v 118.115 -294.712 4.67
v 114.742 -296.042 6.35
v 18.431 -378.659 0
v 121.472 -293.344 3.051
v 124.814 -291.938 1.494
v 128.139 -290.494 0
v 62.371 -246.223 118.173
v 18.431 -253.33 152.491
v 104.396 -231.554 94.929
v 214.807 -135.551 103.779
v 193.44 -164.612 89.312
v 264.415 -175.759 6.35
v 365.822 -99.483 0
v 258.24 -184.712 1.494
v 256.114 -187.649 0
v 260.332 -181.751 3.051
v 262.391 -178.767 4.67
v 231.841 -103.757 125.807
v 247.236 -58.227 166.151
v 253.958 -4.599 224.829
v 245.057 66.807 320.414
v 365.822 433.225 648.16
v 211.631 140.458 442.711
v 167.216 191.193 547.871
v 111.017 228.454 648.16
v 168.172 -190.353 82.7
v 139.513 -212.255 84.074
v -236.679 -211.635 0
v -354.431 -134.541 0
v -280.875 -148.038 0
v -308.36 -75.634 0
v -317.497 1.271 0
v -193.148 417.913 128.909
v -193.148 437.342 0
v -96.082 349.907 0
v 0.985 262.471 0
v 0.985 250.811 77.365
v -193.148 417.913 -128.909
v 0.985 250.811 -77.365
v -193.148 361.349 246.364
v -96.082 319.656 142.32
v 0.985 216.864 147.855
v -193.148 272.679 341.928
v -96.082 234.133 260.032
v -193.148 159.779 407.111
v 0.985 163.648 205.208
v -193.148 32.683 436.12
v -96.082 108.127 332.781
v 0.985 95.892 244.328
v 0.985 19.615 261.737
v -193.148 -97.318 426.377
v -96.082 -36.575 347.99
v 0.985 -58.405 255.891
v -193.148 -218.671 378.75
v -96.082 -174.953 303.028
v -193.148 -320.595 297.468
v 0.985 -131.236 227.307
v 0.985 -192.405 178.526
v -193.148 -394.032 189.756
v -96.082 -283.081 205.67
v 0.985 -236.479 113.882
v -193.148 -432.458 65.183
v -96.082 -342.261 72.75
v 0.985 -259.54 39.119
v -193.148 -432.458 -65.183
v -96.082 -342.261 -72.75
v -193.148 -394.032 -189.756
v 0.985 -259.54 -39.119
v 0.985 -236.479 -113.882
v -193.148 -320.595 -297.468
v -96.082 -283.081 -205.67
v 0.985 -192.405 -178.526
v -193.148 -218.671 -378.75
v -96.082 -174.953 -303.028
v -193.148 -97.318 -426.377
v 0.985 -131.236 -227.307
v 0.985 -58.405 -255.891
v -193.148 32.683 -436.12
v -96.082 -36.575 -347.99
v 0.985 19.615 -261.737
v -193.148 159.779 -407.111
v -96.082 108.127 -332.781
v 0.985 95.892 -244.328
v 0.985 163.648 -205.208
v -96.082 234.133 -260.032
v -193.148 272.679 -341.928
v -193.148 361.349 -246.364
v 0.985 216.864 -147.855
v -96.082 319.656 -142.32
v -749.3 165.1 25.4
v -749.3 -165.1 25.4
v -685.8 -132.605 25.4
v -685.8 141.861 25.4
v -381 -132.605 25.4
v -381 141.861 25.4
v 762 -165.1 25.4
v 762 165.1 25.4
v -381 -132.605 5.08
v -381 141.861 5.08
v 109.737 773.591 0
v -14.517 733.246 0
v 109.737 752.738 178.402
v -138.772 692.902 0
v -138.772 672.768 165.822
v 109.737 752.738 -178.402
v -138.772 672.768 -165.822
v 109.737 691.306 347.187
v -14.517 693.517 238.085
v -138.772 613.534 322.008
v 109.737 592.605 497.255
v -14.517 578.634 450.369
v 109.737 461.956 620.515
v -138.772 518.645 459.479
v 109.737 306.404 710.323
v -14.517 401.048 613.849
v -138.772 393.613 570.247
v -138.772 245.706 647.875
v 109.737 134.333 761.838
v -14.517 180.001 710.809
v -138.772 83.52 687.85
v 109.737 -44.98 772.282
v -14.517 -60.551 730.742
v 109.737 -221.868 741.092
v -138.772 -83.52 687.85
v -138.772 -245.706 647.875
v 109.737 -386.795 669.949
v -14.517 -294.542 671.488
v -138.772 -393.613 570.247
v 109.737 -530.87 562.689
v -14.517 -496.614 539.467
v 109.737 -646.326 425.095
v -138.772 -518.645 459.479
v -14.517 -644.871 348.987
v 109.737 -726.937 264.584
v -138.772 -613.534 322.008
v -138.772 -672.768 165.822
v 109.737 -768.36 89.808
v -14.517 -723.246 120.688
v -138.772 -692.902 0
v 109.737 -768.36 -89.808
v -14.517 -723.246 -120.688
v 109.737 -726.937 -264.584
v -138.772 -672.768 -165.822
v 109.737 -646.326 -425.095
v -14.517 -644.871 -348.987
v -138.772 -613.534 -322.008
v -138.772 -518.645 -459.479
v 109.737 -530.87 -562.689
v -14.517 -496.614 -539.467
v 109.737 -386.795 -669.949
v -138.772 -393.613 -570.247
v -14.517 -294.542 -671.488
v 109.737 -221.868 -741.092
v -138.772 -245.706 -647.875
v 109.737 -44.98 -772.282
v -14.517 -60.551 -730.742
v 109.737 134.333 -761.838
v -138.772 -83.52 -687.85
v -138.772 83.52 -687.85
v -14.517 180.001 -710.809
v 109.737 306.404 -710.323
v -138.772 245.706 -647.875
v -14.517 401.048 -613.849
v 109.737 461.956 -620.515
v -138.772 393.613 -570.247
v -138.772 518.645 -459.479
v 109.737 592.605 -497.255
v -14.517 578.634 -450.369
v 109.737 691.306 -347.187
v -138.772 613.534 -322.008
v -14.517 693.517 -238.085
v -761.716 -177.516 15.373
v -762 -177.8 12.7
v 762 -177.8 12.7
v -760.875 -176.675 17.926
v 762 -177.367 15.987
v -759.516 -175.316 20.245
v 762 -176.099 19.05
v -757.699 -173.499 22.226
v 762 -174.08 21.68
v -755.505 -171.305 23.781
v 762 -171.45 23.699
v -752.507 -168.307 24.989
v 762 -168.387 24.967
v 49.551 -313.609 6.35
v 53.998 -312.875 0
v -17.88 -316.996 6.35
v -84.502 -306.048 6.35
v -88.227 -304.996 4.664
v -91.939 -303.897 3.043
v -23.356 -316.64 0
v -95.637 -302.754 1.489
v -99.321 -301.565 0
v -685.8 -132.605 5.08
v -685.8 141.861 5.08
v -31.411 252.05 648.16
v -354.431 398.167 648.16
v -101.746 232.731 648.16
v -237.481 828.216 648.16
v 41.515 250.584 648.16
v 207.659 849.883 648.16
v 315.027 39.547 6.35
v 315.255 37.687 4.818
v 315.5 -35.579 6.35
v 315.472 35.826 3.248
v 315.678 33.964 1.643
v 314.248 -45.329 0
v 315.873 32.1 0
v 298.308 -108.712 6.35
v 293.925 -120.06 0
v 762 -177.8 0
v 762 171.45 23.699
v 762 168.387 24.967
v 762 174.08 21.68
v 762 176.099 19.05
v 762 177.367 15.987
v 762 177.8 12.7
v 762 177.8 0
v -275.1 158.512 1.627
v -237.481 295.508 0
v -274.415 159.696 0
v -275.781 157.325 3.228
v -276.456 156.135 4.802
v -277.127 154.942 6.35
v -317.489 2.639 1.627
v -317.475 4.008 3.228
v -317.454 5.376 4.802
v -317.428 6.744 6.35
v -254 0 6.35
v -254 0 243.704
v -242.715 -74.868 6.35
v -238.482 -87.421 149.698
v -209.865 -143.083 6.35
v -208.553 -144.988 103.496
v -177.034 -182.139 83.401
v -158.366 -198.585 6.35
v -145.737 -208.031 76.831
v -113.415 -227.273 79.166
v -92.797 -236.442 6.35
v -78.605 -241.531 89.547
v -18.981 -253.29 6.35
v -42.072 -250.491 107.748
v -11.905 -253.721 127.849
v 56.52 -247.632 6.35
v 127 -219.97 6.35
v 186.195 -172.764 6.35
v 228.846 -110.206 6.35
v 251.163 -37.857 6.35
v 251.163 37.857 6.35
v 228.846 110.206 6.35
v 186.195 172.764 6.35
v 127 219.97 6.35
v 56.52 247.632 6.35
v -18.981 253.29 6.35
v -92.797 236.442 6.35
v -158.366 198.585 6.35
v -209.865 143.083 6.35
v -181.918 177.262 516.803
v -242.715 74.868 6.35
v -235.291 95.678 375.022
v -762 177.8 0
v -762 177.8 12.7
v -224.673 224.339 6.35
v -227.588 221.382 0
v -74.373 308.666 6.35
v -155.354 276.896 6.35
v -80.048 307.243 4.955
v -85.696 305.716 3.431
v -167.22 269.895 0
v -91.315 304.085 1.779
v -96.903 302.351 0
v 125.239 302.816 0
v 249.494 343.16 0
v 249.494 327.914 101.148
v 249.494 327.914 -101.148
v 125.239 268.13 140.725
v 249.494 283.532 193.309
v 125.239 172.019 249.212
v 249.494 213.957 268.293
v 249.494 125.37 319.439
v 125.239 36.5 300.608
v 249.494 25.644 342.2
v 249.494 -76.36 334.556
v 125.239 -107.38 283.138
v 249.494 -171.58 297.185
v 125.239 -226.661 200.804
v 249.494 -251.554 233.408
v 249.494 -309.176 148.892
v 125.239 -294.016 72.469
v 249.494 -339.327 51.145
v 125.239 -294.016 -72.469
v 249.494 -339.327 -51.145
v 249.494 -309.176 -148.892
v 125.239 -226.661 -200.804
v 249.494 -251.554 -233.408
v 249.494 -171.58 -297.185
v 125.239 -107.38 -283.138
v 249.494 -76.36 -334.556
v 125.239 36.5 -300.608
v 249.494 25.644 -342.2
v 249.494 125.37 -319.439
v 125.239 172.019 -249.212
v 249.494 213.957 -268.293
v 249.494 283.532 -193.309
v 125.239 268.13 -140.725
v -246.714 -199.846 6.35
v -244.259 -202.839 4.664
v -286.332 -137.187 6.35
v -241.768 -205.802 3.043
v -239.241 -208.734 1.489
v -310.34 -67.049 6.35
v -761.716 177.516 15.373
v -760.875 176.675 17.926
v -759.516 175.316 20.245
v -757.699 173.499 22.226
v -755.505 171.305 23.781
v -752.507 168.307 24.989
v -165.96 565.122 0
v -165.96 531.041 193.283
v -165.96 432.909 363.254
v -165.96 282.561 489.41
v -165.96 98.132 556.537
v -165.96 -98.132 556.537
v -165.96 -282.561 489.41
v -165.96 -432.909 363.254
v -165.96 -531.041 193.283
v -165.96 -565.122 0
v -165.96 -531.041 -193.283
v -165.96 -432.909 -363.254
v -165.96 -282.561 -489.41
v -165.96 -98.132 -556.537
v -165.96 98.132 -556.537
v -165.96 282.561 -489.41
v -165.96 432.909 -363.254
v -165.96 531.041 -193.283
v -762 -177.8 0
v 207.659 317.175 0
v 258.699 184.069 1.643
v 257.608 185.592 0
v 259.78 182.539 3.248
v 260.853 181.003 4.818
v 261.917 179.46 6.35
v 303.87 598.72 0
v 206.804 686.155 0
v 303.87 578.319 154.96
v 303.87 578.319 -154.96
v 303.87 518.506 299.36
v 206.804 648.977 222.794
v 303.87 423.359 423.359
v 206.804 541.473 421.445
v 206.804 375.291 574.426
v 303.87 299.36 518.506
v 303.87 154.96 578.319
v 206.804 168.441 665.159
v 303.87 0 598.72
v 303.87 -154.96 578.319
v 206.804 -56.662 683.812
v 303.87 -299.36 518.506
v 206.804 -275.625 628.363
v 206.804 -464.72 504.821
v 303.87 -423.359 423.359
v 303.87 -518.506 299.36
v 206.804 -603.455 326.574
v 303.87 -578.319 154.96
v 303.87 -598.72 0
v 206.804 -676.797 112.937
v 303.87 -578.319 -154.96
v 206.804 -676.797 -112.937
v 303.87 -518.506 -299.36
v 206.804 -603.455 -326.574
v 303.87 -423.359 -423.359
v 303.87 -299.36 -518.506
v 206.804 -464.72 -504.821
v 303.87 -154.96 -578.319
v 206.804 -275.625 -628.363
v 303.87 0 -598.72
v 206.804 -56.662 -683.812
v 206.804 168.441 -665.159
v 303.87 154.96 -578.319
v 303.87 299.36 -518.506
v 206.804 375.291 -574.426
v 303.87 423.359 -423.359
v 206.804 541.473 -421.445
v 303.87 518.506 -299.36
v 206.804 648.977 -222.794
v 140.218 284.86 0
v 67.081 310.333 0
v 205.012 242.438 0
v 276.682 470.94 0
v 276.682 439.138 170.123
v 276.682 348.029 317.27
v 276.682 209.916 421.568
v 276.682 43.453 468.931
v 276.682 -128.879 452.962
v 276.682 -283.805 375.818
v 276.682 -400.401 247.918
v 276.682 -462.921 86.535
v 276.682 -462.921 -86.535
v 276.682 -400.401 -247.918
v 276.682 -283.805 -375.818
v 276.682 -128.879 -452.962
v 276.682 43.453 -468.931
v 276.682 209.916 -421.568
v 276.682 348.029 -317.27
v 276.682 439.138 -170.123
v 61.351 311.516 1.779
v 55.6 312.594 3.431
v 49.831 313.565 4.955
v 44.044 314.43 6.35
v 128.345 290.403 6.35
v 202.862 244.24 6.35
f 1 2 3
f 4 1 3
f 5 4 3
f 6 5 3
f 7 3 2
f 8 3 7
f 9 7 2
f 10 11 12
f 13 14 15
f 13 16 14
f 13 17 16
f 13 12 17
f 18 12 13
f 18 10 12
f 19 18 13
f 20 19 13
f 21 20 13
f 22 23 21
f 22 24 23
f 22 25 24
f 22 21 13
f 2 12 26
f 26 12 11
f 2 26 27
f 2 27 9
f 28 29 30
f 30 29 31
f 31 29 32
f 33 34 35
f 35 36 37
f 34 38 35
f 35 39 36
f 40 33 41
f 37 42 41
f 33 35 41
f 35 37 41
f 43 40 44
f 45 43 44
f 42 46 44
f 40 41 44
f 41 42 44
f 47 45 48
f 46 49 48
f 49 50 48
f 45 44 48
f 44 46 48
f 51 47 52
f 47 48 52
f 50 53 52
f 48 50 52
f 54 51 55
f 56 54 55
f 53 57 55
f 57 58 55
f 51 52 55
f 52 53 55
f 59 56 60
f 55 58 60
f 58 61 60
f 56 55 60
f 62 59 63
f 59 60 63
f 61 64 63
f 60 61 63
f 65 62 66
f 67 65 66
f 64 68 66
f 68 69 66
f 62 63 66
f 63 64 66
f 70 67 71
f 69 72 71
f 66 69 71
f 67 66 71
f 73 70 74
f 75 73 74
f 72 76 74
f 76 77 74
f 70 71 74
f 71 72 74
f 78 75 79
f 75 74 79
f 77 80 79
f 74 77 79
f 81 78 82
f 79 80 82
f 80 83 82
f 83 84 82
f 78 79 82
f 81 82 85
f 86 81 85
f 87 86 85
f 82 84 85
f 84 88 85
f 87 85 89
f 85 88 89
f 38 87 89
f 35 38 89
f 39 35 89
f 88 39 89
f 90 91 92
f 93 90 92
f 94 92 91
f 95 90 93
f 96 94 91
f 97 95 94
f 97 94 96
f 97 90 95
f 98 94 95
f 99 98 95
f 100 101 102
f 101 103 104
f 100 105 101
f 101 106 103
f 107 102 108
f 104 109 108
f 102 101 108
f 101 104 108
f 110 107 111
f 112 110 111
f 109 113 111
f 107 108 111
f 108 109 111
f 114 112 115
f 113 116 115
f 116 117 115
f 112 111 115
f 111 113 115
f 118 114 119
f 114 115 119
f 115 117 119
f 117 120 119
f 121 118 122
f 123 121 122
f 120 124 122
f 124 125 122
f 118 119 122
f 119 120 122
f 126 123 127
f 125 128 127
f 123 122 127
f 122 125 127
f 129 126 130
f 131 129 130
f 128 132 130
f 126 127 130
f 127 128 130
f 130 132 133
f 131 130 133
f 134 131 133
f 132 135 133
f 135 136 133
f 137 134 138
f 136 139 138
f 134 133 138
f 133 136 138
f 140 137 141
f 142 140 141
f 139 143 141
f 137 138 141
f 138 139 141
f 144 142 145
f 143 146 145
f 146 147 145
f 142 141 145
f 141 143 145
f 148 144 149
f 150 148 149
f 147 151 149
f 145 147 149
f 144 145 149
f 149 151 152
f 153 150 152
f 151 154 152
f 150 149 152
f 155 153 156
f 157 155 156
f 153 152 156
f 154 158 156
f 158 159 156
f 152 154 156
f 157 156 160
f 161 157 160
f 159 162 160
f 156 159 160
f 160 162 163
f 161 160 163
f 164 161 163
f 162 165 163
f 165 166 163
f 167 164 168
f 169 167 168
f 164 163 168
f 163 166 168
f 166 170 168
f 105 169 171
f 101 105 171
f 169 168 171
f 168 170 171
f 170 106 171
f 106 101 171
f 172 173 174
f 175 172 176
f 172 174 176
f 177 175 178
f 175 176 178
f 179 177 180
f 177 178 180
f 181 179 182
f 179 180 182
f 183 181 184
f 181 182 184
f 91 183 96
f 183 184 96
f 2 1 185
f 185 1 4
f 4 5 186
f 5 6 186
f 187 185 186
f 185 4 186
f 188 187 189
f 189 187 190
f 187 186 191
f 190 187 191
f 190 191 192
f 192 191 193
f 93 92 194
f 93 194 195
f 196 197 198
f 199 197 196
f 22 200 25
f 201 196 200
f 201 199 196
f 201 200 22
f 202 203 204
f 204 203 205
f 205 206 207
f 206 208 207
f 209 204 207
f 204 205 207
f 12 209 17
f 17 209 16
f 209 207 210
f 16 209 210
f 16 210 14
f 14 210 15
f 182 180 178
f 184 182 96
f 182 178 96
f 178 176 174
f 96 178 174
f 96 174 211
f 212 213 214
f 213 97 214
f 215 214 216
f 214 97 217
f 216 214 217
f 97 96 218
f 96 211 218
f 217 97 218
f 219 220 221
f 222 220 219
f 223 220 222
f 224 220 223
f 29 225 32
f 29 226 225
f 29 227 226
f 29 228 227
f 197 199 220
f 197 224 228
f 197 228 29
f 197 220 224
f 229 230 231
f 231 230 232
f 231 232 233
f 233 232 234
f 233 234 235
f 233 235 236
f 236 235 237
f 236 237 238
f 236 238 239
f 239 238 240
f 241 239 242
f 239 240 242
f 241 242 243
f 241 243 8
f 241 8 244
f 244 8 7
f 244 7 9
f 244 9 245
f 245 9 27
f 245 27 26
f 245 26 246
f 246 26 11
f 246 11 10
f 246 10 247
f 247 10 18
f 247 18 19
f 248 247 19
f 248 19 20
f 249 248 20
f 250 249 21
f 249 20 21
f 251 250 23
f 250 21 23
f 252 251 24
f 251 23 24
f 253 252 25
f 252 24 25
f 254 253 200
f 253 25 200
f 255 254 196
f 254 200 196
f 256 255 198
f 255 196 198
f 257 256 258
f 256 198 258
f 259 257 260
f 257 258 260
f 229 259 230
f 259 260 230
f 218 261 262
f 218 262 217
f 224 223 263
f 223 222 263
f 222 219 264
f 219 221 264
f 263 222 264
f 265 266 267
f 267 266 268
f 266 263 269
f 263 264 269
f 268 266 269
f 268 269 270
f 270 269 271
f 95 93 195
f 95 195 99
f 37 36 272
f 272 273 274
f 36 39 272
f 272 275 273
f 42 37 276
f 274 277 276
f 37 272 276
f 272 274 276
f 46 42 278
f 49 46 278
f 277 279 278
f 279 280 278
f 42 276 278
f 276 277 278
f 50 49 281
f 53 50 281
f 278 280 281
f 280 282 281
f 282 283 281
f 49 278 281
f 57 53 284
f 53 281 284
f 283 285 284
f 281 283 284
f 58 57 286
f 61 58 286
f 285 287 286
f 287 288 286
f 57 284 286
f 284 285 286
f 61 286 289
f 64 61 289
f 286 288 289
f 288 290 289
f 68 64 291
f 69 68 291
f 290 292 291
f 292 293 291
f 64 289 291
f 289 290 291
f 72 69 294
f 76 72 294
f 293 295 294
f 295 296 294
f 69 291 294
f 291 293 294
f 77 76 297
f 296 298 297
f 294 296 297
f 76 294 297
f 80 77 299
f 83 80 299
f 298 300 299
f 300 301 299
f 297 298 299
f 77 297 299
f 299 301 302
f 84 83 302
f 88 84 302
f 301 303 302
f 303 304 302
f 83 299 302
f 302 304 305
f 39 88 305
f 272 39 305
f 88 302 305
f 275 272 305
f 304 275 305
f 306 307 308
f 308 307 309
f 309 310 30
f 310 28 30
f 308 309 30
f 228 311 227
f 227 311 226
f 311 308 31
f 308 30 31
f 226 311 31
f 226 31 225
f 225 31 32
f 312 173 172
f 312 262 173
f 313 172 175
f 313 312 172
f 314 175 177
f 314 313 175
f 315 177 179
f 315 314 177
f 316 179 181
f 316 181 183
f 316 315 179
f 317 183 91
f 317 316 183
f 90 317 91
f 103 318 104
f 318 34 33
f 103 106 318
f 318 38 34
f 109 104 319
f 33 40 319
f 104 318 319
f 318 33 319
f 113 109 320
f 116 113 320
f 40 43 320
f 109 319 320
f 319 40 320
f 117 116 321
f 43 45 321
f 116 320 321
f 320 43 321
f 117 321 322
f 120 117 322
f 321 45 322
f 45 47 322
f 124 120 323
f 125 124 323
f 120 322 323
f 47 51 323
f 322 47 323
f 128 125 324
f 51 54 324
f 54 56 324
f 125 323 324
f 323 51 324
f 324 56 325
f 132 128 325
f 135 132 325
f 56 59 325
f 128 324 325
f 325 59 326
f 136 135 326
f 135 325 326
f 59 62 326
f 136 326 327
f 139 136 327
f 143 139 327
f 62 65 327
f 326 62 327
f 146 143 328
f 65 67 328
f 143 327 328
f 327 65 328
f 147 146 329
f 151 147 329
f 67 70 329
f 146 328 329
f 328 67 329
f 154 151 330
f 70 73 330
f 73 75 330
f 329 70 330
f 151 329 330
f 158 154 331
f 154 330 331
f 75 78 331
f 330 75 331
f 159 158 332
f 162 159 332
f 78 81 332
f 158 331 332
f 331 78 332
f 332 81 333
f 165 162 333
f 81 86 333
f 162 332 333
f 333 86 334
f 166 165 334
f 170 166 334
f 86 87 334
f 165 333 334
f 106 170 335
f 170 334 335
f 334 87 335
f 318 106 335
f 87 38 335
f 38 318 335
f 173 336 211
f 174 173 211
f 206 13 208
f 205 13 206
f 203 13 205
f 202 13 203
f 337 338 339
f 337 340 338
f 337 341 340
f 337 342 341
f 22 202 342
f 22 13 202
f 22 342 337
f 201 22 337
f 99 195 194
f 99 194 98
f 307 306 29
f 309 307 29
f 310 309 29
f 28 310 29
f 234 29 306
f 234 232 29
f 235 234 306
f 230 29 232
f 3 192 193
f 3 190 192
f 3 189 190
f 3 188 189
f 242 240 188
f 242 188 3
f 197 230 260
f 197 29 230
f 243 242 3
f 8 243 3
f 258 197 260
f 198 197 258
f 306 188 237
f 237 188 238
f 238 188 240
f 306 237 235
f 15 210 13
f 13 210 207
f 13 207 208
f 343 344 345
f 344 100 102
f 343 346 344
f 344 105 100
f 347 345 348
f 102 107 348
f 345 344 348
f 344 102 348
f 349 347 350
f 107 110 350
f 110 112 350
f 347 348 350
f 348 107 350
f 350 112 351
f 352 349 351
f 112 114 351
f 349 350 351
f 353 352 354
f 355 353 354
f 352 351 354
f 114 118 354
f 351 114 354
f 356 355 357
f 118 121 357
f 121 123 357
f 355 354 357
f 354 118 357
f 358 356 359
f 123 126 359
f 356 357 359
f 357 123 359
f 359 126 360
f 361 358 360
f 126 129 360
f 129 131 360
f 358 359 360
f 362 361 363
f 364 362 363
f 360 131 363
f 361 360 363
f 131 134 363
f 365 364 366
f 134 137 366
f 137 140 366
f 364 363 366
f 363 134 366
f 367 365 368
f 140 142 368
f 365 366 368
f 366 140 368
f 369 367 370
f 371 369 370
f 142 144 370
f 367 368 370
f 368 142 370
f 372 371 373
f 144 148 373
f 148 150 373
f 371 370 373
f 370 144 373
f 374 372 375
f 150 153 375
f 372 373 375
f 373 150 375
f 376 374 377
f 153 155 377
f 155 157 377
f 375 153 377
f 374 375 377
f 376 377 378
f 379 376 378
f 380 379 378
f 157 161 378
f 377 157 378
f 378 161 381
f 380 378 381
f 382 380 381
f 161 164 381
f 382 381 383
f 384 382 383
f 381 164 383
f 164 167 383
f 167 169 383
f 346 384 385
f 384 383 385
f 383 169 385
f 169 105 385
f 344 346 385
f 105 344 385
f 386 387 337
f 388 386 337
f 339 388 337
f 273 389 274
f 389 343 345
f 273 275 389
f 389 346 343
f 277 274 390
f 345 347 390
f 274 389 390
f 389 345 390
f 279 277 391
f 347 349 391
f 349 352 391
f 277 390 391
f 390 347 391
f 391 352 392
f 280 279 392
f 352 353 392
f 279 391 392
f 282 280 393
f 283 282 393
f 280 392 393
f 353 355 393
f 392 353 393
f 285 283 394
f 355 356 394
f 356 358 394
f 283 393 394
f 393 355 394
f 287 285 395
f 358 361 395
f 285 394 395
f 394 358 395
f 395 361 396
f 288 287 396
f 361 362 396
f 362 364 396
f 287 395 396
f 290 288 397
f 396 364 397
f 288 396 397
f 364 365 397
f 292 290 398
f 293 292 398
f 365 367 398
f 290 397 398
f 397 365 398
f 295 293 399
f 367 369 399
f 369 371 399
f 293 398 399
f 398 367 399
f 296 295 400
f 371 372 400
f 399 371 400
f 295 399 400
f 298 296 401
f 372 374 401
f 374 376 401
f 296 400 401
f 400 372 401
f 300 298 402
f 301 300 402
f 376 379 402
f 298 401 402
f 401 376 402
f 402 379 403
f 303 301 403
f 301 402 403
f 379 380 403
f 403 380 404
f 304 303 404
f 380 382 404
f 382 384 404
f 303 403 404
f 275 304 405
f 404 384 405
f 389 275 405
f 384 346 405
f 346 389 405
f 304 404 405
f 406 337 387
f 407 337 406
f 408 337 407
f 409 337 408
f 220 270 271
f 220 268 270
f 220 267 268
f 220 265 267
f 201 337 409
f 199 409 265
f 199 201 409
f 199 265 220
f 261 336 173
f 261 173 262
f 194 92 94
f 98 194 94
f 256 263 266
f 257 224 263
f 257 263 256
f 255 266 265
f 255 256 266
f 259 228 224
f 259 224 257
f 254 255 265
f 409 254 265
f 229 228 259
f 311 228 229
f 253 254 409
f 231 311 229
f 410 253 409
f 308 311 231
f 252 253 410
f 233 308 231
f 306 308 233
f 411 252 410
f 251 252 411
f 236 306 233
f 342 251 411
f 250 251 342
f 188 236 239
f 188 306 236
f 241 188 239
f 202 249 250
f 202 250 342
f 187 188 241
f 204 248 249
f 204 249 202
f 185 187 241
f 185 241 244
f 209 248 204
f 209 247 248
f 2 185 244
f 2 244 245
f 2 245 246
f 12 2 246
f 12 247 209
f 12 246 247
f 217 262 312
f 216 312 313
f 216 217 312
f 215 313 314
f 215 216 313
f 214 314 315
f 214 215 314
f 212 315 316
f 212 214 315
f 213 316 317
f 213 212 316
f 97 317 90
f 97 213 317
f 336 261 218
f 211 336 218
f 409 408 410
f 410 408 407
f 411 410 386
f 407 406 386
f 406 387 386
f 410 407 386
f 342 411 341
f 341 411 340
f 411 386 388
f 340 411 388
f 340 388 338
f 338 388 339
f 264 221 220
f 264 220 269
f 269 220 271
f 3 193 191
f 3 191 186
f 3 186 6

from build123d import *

# Parameters (mm, degrees)
F0_W            = 1524
F0_H            = 355.6
F1_DEPTH        = 25.4
F2_W            = 304.8
F2_H            = 274.4666785002
F3_DEPTH        = 20.32
F4_R            = 12.7
F10_D           = 508
F10_CBORE_D     = 635
F10_CBORE_DEPTH = 6.35


with BuildPart() as f1:
    # F0 (on Top) → F1 (new body)
    with BuildSketch(Plane.XY):
        Rectangle(F0_W, F0_H)
    extrude(amount=F1_DEPTH)

    # F2 (on face) → F3 (cut)
    with BuildSketch(Plane.XY.offset(25.4)):
        with Locations((-533.4, 4.6280100942)):
            Rectangle(F2_W, F2_H)
    extrude(amount=-F3_DEPTH, mode=Mode.SUBTRACT)

    # F4
    f4_edges = [f1.edges().sort_by_distance(p)[0] for p in [
        (0, -177.8, 25.4),
        (-762, 0, 25.4),
        (0, 177.8, 25.4),
    ]]
    fillet(f4_edges, radius=F4_R)


with BuildPart() as f6:
    # F5 (on Top) → F6 (revolve)
    with BuildSketch(Plane.XY):
        Polygon((249.4940546944, 343.159991284), (303.8703414009, 598.7196388048), (109.7373378189, 773.5907082165), (-138.7719524696, 692.9021301073), (-193.148239176, 437.3424825865), (0.984764406, 262.4714131748), align=None)
    revolve(axis=Axis((532.8862667084, 0, 0), (1, 0, 0)))


with BuildPart() as f9:
    # F9: sweep along a path in F8
    with BuildLine(Plane.YZ) as f9_path:
        Line((0, 0), (532.7080605955, 648.1598140979))
    # F7 (on Top) → F9 (sweep)
    with BuildSketch(Plane.XY):
        Polygon((18.4311241139, -378.6591803821), (365.821811534, -99.483081123), (207.6591892402, 317.1752549426), (-237.4813745074, 295.5081690679), (-354.4307503808, -134.5411625054), align=None)
    sweep(path=f9_path.line)

    # F10 (through all)
    with Locations(Plane(origin=(0, 0, 0), x_dir=(1, 0, 0), z_dir=(0, 0, -1))):
        with Locations((0, 0)):
            CounterBoreHole(F10_D / 2, F10_CBORE_D / 2, F10_CBORE_DEPTH)


solid = Compound([f1.part, f6.part, f9.part])
